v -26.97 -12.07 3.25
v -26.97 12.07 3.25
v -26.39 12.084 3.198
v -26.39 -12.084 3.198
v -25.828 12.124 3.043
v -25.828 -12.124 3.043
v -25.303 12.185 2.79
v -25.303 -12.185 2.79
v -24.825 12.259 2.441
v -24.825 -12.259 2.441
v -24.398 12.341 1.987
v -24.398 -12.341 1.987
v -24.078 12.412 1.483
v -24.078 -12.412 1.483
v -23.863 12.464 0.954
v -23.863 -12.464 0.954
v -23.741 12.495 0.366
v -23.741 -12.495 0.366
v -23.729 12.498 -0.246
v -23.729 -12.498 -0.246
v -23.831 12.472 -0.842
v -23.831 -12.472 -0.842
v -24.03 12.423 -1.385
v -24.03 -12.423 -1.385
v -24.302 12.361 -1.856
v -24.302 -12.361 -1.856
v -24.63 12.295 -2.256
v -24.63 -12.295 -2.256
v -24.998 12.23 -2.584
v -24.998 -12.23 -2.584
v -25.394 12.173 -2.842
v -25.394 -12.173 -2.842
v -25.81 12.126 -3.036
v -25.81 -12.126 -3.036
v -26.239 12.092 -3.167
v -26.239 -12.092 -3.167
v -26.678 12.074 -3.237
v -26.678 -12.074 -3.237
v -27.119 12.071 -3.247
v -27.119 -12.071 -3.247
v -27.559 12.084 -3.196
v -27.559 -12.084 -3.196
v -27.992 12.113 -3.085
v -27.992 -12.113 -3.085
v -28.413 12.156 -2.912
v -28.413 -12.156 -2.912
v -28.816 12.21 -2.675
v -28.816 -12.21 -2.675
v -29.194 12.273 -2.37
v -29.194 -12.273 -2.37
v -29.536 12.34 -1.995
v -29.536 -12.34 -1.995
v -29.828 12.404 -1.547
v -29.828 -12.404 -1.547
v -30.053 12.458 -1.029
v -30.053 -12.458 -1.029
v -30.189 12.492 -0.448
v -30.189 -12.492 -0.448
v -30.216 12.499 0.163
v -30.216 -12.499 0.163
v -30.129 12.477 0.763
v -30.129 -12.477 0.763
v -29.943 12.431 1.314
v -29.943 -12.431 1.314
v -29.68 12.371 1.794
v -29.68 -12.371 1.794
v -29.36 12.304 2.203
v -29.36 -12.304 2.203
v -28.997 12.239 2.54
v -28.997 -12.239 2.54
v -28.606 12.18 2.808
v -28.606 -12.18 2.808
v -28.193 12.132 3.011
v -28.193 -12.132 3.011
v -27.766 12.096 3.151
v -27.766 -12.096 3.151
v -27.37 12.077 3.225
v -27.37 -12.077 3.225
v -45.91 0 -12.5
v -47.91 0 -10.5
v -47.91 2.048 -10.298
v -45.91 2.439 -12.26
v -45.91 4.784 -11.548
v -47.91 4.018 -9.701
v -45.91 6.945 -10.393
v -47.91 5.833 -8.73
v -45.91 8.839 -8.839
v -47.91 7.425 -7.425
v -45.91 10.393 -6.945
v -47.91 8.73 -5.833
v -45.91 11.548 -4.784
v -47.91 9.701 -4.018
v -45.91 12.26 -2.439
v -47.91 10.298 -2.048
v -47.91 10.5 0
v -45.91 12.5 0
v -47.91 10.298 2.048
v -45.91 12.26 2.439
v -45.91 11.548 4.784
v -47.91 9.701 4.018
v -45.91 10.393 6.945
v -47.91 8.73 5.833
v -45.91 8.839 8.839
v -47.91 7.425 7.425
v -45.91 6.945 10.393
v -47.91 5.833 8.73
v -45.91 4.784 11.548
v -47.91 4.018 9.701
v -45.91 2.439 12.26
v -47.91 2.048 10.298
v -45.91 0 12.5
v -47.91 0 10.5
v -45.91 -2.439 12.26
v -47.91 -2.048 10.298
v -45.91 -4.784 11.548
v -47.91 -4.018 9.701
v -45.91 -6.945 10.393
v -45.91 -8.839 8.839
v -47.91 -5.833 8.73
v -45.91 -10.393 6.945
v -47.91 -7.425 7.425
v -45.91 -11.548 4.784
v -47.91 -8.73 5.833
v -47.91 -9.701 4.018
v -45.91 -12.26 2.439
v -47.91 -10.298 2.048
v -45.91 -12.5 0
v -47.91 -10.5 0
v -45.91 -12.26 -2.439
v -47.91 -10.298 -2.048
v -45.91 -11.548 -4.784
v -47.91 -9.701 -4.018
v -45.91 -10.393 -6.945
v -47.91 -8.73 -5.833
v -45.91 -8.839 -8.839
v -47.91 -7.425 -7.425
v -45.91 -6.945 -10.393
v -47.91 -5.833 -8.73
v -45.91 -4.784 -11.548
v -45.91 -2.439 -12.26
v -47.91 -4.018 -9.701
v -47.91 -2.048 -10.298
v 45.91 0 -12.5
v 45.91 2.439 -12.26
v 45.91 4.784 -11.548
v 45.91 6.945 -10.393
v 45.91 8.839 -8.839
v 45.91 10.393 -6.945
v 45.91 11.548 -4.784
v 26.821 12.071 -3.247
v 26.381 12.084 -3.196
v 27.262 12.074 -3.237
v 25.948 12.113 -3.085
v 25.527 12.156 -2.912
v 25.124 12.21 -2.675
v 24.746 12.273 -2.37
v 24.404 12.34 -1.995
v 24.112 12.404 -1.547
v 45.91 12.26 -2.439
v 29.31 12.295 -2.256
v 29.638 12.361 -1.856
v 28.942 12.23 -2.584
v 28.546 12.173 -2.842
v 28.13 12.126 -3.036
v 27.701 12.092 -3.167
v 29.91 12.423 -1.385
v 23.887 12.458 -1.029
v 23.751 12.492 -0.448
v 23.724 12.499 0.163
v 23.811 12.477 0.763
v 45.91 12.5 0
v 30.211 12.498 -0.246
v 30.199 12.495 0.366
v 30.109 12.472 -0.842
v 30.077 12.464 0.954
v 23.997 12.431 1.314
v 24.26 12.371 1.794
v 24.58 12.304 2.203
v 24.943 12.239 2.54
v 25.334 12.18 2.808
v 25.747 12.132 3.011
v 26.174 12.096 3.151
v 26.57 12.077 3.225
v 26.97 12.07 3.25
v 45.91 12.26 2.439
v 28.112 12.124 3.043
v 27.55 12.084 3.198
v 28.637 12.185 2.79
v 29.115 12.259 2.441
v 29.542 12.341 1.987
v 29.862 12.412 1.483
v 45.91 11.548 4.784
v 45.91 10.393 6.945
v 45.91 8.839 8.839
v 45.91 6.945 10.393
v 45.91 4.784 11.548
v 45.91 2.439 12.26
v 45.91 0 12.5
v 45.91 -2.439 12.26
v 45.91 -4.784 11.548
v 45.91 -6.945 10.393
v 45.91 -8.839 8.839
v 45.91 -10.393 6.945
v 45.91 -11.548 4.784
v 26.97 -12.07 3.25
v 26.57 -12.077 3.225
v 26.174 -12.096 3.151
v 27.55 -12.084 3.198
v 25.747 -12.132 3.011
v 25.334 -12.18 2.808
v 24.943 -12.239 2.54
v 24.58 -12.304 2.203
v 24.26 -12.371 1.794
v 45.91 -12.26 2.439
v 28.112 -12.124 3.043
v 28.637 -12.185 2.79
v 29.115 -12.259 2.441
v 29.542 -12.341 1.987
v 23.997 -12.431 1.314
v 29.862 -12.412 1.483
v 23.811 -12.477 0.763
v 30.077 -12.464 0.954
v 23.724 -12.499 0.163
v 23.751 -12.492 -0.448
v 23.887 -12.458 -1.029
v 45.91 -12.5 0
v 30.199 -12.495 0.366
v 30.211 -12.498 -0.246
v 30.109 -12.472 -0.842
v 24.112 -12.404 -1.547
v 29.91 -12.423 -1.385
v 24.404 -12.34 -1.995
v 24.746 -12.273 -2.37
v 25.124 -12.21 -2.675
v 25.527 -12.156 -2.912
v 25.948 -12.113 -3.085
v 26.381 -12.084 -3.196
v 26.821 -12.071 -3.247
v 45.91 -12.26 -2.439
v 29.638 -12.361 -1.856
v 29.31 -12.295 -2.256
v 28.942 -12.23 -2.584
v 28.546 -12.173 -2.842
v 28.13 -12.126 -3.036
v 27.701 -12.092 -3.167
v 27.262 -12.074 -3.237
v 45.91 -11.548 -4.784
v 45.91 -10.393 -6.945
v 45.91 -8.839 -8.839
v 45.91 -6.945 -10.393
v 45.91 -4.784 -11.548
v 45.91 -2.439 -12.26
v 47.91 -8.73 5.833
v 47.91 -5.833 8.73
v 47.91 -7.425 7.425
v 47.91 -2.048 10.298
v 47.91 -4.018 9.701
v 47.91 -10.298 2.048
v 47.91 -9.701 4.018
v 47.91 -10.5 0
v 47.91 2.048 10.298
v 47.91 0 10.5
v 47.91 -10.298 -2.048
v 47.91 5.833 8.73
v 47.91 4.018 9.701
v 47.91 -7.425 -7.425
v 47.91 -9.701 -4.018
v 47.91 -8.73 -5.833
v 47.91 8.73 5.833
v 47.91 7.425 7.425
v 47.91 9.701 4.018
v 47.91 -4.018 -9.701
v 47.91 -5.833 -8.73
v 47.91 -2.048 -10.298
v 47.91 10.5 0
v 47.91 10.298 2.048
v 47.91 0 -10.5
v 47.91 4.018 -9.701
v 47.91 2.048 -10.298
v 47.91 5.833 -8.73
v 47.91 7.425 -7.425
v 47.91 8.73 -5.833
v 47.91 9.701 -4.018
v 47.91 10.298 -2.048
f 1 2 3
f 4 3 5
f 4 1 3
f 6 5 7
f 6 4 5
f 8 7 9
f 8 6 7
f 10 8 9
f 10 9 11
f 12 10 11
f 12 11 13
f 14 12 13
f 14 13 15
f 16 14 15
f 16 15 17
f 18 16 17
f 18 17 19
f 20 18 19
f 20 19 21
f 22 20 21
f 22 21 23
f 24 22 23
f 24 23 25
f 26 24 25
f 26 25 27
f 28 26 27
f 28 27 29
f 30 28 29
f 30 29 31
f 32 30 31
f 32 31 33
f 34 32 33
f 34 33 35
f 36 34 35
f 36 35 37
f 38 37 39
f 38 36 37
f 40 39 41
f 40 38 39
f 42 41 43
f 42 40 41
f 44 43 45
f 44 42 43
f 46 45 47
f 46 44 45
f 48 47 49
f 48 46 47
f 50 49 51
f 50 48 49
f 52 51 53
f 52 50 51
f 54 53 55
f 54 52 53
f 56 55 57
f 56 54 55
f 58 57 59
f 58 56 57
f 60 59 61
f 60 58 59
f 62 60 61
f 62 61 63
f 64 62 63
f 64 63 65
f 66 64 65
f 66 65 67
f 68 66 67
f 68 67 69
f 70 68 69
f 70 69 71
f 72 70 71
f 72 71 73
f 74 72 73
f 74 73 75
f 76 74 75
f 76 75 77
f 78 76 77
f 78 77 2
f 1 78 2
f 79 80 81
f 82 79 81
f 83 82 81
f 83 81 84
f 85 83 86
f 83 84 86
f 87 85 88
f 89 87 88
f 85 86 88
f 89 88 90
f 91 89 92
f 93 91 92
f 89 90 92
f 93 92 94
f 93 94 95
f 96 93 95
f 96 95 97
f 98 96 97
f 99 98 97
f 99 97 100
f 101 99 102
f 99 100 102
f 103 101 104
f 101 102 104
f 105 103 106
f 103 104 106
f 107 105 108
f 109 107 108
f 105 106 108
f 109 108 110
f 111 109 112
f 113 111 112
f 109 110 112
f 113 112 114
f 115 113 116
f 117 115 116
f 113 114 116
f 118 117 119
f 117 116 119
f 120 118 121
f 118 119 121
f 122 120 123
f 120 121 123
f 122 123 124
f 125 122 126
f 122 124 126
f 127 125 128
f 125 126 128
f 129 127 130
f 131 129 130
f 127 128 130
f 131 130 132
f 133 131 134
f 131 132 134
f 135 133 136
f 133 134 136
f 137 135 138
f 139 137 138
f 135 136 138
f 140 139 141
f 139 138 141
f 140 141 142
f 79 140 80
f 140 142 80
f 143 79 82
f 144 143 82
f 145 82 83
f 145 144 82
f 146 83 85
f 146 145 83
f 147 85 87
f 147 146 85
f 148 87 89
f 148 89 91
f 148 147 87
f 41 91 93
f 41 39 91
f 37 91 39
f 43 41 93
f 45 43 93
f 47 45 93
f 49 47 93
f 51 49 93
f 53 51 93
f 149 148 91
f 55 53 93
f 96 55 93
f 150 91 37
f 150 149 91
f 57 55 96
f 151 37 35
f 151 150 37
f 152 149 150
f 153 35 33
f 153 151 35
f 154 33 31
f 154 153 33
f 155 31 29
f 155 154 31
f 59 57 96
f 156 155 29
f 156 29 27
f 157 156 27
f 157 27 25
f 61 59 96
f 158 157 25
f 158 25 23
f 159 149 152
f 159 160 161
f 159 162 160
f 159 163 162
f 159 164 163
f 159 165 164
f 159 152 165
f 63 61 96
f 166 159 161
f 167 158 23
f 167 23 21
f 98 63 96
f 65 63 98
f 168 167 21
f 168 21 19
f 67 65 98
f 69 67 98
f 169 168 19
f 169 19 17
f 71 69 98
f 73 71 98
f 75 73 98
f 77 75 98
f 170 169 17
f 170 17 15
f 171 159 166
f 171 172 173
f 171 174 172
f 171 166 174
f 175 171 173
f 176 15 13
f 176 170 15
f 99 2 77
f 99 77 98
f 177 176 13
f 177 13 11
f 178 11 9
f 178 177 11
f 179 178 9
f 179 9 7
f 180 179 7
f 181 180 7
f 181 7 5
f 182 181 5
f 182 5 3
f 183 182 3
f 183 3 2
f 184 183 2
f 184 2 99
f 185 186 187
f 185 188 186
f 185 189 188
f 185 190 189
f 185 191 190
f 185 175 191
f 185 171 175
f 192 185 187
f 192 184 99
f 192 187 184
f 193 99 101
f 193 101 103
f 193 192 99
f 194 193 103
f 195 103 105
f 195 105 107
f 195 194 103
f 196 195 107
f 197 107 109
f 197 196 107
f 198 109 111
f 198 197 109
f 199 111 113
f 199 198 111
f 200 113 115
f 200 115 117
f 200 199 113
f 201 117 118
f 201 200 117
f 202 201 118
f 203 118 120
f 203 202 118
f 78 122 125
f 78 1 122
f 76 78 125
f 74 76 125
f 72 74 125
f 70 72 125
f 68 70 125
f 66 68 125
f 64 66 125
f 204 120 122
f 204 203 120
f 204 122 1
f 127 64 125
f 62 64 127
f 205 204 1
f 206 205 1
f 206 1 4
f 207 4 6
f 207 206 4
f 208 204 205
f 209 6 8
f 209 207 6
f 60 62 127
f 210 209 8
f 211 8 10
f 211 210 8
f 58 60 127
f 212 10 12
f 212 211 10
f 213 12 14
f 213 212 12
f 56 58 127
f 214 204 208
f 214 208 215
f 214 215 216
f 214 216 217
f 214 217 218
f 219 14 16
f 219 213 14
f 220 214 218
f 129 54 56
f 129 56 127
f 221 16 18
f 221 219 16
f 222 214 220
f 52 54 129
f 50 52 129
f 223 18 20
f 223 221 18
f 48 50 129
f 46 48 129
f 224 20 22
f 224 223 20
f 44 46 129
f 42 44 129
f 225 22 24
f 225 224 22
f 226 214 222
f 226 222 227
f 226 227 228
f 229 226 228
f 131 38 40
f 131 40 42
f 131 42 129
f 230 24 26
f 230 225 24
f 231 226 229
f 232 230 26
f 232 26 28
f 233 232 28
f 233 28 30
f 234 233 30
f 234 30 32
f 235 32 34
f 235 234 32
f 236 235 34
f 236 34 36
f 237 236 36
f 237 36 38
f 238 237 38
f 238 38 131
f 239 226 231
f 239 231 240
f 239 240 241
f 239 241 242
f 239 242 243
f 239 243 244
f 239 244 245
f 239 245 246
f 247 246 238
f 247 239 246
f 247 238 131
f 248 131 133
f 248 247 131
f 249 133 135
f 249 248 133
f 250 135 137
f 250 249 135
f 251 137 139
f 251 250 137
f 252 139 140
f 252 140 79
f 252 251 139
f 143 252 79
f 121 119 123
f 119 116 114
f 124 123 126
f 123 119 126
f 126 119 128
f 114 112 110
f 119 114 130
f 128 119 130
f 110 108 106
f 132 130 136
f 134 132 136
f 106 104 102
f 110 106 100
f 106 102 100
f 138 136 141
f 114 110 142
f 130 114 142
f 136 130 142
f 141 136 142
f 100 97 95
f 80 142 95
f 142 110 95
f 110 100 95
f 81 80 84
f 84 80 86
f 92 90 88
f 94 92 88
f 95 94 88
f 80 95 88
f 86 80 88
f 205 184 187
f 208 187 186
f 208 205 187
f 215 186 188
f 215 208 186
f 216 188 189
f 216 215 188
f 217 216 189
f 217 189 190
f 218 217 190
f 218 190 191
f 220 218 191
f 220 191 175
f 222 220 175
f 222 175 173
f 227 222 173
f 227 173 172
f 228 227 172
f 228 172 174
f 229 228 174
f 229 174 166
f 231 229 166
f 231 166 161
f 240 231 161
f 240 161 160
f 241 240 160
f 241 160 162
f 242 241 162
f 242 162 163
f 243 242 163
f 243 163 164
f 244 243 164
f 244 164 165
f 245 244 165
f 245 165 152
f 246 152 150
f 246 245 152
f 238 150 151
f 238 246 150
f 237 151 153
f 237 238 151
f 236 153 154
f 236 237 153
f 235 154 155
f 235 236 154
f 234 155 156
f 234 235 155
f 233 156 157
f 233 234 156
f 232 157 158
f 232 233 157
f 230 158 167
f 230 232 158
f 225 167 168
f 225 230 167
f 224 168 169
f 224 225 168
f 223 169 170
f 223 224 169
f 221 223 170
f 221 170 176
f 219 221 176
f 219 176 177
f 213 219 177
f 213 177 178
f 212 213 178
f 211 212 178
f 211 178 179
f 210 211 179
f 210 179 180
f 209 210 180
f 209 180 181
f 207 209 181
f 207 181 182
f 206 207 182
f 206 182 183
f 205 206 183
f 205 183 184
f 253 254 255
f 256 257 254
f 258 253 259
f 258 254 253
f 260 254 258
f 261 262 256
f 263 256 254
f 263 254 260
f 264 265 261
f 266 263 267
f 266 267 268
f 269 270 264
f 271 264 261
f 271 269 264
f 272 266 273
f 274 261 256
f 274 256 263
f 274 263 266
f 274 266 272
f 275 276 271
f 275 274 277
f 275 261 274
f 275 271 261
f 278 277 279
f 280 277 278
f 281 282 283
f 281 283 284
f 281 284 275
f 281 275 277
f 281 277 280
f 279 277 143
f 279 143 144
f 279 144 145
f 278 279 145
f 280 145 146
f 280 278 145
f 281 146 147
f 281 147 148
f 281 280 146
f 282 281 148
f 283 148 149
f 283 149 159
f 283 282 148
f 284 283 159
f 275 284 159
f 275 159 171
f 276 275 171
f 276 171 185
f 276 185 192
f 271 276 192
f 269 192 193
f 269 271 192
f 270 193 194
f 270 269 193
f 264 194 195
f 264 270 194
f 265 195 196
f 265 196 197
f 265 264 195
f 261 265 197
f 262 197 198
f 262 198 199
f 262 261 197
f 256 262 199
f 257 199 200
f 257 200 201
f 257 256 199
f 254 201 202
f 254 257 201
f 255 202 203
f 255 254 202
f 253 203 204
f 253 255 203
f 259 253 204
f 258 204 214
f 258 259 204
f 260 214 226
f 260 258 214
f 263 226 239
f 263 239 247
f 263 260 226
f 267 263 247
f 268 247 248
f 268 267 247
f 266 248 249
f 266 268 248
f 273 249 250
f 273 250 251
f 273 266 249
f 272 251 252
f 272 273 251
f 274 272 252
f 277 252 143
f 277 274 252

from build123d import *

# Parameters (mm, degrees)
ESBO_O1_R                  = 12.5
RESSALTO_EXTRUS_O1_DEPTH   = 47.91
CHANFRO1_SIZE              = 2
CORTE_EXTRUS_O1_DEPTH      = 52.067289922
CORTE_EXTRUS_O1_DEPTH_BACK = 52.067289922
ESBO_O2_R                  = 3.25


with BuildPart() as part:
    # Esboço1 → Ressalto-extrusão1 (new, symmetric)
    with BuildSketch(Plane(origin=(0, 0, 0), x_dir=(0, -1, 0), z_dir=(1, 0, 0))):
        with Locations(Location((0, 0, 0), (0, 0, 90))):
            Circle(ESBO_O1_R)
    extrude(amount=RESSALTO_EXTRUS_O1_DEPTH, both=True)

    # Chanfro1
    chanfro1_edges = [part.edges().sort_by_distance(p)[0] for p in [
        (-47.91, 0, 12.5),
        (47.91, 0, 12.5),
    ]]
    chamfer(chanfro1_edges, length=CHANFRO1_SIZE)

    # Esboço2 → Corte-extrusão1 (cut, two sides: drawn at the far end of the back side and taken through both)
    with BuildSketch(Plane(origin=(0, 0, 0), x_dir=(1, 0, 0), z_dir=(0, 1, 0)).offset(-CORTE_EXTRUS_O1_DEPTH_BACK)):
        with Locations(Location((-26.97, 0, 0), (0, 0, 270))):
            Circle(ESBO_O2_R)
        with Locations(Location((26.97, 0, 0), (0, 0, 270))):
            Circle(ESBO_O2_R)
    extrude(amount=CORTE_EXTRUS_O1_DEPTH + CORTE_EXTRUS_O1_DEPTH_BACK, mode=Mode.SUBTRACT)


solid = part.part
